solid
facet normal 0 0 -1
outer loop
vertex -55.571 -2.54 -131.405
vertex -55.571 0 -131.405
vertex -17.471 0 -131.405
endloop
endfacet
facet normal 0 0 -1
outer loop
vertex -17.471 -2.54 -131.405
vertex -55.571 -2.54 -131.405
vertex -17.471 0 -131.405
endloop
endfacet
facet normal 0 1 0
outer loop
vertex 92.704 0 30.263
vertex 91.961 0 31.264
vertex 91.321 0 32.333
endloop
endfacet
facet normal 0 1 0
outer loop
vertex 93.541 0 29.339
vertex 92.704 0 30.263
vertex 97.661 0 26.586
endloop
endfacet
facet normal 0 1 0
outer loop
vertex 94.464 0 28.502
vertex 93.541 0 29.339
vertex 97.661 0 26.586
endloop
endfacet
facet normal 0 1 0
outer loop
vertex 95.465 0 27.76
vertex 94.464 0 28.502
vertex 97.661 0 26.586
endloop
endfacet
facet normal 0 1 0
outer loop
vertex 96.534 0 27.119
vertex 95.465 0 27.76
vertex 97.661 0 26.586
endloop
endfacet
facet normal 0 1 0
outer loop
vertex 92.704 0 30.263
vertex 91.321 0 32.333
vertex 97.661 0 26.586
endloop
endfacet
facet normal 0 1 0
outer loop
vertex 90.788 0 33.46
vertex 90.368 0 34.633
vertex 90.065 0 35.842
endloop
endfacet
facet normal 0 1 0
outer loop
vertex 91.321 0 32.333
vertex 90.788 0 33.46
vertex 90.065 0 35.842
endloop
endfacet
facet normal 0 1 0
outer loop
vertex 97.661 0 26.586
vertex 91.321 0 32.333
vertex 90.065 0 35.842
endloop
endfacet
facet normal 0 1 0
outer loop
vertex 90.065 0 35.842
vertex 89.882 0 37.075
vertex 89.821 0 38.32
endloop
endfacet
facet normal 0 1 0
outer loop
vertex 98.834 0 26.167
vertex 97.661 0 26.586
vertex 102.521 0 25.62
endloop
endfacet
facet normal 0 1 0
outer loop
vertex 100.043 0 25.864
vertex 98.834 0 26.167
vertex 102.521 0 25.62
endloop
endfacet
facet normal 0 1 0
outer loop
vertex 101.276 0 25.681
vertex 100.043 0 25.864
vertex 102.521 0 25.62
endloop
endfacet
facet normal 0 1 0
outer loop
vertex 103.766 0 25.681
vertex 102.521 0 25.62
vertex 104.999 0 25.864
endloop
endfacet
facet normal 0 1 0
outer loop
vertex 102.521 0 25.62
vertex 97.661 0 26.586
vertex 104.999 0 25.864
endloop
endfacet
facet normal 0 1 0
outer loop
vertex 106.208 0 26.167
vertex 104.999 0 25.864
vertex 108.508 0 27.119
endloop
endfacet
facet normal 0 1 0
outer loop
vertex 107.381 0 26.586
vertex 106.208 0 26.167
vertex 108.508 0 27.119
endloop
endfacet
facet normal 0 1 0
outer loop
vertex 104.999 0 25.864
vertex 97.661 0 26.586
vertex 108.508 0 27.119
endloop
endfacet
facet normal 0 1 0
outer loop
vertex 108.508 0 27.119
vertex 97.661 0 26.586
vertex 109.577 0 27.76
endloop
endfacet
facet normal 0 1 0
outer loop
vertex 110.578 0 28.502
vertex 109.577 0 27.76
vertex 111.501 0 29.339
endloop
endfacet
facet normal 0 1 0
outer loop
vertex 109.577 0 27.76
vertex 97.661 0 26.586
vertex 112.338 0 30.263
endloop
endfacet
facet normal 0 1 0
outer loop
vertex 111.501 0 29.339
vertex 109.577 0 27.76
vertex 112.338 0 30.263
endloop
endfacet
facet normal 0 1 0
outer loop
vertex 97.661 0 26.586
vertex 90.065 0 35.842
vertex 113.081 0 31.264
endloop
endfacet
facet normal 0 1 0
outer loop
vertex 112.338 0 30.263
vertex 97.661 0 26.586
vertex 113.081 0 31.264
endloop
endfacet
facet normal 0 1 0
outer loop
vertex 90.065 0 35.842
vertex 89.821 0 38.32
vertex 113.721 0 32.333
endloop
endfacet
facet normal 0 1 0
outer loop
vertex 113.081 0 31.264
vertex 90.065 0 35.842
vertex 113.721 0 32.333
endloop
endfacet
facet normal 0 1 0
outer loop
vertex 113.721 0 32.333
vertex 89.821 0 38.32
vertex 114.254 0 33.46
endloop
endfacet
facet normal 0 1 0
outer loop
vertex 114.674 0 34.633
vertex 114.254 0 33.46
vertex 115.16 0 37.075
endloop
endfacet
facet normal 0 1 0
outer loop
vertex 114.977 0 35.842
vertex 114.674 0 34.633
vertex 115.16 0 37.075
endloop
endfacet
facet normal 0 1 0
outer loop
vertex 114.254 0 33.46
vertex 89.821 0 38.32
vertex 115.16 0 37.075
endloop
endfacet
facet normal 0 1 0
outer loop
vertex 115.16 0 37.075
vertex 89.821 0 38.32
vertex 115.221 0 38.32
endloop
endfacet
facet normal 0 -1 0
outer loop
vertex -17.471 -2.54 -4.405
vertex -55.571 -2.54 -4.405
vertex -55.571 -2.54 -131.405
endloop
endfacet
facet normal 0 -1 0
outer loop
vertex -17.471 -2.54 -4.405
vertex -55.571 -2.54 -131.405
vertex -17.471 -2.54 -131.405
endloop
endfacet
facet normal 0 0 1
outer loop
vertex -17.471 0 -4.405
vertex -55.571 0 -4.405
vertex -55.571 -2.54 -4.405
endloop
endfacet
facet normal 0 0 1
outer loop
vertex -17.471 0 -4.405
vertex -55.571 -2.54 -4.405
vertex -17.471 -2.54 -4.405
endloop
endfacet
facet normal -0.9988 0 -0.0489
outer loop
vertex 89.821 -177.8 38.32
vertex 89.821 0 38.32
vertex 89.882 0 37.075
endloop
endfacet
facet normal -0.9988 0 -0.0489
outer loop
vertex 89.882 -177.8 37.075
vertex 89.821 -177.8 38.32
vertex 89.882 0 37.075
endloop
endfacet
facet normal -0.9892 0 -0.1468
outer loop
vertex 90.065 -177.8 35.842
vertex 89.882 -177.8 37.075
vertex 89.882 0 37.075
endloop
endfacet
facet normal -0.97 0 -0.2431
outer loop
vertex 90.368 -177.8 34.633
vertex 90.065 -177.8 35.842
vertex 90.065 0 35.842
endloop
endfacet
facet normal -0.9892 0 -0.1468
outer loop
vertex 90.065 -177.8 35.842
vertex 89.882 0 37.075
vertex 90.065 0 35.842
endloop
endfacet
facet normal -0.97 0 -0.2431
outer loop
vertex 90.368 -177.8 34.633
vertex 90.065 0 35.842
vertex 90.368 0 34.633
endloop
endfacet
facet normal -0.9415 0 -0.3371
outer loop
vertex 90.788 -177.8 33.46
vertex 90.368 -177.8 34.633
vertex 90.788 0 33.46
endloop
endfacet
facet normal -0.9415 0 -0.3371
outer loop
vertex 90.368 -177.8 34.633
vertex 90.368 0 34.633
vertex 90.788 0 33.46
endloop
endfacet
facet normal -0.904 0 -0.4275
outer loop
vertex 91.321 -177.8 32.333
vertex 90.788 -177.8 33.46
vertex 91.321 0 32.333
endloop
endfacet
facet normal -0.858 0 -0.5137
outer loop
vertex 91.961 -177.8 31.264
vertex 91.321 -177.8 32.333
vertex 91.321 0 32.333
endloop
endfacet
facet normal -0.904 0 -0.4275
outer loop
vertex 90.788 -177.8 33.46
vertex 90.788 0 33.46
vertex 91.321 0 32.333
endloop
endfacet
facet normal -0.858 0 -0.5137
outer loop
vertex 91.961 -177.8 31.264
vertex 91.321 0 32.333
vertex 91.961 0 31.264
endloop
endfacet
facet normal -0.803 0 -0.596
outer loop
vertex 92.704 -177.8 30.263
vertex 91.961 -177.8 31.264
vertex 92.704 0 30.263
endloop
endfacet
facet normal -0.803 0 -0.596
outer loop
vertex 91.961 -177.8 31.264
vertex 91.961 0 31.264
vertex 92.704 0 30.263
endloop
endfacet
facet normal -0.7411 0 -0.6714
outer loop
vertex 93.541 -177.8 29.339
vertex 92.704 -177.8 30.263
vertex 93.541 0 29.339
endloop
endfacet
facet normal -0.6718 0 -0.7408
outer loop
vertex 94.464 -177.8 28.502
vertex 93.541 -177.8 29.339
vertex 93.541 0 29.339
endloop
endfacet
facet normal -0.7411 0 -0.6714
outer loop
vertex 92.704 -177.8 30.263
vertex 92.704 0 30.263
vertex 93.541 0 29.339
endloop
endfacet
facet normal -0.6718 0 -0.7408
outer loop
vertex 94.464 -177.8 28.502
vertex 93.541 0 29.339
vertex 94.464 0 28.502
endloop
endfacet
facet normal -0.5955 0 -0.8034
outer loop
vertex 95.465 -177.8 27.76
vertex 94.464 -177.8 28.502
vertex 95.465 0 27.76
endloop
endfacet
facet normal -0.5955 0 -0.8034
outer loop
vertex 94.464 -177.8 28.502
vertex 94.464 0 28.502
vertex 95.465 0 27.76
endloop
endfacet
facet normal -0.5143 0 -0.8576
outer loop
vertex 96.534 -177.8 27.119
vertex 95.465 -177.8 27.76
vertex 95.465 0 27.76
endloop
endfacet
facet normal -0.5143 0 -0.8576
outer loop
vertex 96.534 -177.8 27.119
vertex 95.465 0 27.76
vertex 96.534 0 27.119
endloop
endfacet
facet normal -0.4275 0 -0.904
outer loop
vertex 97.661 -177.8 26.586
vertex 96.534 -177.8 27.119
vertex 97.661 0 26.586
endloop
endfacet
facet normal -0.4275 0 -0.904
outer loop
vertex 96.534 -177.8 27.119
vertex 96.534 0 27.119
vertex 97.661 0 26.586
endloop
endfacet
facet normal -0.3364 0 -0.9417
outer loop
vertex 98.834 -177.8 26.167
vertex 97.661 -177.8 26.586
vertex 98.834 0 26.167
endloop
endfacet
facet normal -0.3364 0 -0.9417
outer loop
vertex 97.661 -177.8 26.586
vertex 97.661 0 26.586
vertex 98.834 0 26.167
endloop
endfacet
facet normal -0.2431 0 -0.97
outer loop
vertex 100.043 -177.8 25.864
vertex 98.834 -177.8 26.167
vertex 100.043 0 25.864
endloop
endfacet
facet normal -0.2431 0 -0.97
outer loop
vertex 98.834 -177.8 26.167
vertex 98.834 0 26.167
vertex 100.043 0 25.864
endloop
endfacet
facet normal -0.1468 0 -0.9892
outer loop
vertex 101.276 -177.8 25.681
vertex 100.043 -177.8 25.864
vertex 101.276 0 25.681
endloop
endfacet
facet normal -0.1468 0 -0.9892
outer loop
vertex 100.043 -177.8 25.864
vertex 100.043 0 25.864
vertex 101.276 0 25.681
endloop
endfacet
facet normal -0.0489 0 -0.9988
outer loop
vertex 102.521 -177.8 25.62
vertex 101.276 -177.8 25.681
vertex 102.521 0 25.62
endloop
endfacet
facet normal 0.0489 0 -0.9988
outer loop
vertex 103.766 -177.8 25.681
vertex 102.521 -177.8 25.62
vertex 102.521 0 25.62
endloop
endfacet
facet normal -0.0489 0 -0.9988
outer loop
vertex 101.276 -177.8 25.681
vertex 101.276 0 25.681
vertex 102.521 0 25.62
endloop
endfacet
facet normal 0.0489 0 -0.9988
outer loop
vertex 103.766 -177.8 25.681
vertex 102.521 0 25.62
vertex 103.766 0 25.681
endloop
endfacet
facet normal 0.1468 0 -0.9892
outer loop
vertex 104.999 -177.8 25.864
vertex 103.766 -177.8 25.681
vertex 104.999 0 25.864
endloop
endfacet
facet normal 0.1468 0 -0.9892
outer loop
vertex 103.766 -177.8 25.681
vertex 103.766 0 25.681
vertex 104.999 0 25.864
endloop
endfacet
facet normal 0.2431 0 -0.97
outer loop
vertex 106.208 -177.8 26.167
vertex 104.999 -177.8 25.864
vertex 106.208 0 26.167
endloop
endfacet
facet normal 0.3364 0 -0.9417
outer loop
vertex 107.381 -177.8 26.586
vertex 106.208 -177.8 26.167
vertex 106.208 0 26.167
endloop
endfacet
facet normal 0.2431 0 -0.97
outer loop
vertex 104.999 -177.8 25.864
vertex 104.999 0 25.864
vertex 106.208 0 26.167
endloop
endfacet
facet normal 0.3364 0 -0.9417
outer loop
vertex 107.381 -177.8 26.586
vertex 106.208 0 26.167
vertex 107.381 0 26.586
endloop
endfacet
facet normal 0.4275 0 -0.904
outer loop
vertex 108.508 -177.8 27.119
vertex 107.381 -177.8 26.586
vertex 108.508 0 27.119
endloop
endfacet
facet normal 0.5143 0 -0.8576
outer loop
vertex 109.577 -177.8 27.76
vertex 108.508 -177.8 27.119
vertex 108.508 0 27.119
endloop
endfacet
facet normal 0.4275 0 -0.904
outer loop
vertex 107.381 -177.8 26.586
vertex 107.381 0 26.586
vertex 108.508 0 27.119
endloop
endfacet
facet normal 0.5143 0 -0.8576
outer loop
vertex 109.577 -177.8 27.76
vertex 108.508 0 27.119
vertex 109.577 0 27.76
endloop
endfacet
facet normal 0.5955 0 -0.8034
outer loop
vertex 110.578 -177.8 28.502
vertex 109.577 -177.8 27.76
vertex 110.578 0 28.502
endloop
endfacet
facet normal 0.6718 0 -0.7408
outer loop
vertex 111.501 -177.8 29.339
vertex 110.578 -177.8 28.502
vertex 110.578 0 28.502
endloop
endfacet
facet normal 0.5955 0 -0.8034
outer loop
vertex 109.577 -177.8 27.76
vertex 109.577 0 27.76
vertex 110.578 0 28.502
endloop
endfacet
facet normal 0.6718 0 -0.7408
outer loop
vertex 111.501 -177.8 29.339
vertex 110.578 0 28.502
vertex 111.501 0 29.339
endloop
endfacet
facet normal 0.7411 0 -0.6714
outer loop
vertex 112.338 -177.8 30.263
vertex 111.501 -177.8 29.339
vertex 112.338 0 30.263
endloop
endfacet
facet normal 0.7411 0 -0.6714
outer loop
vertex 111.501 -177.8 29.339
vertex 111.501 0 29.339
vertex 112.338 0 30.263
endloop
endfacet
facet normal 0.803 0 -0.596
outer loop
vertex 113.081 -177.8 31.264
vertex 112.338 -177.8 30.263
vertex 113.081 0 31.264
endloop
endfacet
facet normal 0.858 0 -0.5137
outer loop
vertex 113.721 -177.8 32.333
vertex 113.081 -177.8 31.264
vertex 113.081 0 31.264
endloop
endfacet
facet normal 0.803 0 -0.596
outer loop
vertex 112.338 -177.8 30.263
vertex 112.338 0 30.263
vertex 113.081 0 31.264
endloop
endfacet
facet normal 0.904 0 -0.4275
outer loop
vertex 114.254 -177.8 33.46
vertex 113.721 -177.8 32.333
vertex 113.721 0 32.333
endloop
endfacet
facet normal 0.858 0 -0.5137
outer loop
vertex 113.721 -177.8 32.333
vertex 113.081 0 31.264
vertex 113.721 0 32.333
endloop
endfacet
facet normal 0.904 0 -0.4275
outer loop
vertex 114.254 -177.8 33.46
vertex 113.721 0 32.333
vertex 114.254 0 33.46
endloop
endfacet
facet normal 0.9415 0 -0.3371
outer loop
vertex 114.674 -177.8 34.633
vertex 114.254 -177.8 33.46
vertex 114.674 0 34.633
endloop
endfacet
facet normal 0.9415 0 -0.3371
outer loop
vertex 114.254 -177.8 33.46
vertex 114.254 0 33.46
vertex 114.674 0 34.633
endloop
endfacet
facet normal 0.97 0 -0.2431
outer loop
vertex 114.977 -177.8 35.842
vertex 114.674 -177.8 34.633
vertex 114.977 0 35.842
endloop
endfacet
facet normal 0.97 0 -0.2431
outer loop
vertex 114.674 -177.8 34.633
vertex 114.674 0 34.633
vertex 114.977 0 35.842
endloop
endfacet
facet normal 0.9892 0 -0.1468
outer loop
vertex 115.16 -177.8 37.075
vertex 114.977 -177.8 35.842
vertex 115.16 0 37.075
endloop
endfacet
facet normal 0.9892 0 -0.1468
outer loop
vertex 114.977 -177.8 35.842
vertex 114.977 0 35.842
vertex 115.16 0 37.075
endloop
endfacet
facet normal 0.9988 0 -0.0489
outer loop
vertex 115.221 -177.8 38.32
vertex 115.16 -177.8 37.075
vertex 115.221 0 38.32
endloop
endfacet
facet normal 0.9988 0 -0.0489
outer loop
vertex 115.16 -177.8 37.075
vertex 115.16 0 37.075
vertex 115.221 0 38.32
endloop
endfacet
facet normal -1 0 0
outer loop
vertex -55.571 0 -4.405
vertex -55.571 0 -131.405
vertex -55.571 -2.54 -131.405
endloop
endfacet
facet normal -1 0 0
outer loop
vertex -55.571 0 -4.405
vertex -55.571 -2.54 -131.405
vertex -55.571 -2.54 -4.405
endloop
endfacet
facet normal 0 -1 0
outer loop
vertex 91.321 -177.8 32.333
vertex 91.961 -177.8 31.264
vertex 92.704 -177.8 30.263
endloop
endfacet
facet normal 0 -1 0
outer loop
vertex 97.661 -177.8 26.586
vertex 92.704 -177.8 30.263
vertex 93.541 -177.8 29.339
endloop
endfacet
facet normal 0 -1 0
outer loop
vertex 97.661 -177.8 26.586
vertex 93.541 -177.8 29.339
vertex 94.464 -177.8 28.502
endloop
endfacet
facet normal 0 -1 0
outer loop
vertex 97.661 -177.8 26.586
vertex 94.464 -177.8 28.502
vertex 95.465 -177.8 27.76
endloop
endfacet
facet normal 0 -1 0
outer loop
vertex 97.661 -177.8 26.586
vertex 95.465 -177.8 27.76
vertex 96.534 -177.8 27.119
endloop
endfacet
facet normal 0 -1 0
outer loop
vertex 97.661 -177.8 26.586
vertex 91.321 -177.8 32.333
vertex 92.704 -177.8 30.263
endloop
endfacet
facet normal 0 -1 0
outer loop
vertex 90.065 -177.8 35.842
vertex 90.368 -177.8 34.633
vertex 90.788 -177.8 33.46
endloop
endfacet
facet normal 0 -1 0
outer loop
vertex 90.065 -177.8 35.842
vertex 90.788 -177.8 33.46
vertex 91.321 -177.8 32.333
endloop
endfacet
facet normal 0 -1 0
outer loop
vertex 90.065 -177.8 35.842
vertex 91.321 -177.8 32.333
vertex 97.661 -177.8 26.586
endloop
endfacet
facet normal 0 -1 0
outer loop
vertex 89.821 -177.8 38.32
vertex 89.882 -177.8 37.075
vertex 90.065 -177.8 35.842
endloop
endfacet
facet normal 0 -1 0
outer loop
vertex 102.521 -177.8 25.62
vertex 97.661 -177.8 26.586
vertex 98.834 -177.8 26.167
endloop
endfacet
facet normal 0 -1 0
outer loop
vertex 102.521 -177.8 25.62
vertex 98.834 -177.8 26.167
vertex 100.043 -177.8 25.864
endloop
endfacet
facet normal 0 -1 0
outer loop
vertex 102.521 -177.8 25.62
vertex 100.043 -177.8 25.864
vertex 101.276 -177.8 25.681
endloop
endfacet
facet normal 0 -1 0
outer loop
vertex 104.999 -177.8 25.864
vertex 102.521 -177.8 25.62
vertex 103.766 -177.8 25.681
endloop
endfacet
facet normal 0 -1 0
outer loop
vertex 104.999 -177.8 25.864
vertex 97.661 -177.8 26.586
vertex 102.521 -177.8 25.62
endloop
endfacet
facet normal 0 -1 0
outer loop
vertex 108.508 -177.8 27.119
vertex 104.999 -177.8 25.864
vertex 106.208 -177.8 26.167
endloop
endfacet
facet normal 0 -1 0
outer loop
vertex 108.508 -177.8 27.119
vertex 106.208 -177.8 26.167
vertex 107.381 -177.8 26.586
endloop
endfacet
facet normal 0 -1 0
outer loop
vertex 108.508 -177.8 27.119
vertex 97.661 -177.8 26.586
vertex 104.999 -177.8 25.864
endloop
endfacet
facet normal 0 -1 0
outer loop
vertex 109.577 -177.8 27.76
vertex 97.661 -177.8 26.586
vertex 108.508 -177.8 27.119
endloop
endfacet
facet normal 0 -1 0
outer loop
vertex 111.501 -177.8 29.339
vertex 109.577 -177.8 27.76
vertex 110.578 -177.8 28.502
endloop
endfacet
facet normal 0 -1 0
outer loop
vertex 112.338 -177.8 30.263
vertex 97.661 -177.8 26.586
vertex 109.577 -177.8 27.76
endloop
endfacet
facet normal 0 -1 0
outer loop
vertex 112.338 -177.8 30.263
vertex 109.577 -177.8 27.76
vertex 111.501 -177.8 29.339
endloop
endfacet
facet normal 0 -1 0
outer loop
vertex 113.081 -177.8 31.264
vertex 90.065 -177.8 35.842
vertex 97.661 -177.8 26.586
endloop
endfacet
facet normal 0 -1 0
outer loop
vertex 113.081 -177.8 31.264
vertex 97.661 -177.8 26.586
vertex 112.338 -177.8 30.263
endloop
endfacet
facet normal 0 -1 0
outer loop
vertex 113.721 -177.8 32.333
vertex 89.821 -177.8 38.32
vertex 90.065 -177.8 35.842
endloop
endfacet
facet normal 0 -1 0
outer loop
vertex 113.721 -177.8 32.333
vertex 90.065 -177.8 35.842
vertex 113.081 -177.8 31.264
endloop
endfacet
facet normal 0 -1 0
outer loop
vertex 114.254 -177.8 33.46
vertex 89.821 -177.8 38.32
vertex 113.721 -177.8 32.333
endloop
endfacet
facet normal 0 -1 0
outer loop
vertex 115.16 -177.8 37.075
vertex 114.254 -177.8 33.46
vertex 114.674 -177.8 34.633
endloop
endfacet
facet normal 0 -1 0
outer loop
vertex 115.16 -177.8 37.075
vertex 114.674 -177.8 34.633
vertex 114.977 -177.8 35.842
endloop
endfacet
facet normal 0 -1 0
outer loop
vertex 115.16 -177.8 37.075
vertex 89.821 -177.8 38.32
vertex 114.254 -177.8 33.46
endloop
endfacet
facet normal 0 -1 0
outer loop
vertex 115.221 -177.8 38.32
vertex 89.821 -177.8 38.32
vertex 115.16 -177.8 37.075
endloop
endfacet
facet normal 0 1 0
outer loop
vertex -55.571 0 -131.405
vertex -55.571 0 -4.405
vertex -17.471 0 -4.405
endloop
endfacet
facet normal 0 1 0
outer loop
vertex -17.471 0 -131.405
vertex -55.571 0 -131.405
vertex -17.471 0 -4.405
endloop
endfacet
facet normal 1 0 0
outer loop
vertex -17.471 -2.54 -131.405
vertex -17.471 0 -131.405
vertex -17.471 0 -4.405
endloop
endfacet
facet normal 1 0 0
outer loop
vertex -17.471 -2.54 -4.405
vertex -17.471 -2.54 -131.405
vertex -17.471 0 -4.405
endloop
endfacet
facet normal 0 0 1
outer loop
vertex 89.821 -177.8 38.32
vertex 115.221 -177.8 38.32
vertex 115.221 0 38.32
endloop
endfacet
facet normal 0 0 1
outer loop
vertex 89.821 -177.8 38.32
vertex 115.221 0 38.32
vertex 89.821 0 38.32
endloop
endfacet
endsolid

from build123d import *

# Parameters (mm, degrees)
F0_W     = 38.1
F0_H     = 127
F1_DEPTH = 2.54
F2_DEPTH = 177.8


with BuildPart() as f1:
    # F0 (on Front) → F1 (new body)
    with BuildSketch(Plane.XZ):
        with Locations((-36.520622, -67.905402)):
            Rectangle(F0_W, F0_H)
    extrude(amount=F1_DEPTH)


with BuildPart() as f2:
    # F0 (on Front) → F2 (new body)
    with BuildSketch(Plane.XZ):
        with BuildLine():
            Line((102.521002, 38.319644), (89.821002, 38.319644))
            ThreePointArc((89.821002, 38.319644), (102.521002, 25.619644), (115.221002, 38.319644))
            Line((115.221002, 38.319644), (102.521002, 38.319644))
        make_face()
    extrude(amount=F2_DEPTH)


solid = Compound([f1.part, f2.part])
